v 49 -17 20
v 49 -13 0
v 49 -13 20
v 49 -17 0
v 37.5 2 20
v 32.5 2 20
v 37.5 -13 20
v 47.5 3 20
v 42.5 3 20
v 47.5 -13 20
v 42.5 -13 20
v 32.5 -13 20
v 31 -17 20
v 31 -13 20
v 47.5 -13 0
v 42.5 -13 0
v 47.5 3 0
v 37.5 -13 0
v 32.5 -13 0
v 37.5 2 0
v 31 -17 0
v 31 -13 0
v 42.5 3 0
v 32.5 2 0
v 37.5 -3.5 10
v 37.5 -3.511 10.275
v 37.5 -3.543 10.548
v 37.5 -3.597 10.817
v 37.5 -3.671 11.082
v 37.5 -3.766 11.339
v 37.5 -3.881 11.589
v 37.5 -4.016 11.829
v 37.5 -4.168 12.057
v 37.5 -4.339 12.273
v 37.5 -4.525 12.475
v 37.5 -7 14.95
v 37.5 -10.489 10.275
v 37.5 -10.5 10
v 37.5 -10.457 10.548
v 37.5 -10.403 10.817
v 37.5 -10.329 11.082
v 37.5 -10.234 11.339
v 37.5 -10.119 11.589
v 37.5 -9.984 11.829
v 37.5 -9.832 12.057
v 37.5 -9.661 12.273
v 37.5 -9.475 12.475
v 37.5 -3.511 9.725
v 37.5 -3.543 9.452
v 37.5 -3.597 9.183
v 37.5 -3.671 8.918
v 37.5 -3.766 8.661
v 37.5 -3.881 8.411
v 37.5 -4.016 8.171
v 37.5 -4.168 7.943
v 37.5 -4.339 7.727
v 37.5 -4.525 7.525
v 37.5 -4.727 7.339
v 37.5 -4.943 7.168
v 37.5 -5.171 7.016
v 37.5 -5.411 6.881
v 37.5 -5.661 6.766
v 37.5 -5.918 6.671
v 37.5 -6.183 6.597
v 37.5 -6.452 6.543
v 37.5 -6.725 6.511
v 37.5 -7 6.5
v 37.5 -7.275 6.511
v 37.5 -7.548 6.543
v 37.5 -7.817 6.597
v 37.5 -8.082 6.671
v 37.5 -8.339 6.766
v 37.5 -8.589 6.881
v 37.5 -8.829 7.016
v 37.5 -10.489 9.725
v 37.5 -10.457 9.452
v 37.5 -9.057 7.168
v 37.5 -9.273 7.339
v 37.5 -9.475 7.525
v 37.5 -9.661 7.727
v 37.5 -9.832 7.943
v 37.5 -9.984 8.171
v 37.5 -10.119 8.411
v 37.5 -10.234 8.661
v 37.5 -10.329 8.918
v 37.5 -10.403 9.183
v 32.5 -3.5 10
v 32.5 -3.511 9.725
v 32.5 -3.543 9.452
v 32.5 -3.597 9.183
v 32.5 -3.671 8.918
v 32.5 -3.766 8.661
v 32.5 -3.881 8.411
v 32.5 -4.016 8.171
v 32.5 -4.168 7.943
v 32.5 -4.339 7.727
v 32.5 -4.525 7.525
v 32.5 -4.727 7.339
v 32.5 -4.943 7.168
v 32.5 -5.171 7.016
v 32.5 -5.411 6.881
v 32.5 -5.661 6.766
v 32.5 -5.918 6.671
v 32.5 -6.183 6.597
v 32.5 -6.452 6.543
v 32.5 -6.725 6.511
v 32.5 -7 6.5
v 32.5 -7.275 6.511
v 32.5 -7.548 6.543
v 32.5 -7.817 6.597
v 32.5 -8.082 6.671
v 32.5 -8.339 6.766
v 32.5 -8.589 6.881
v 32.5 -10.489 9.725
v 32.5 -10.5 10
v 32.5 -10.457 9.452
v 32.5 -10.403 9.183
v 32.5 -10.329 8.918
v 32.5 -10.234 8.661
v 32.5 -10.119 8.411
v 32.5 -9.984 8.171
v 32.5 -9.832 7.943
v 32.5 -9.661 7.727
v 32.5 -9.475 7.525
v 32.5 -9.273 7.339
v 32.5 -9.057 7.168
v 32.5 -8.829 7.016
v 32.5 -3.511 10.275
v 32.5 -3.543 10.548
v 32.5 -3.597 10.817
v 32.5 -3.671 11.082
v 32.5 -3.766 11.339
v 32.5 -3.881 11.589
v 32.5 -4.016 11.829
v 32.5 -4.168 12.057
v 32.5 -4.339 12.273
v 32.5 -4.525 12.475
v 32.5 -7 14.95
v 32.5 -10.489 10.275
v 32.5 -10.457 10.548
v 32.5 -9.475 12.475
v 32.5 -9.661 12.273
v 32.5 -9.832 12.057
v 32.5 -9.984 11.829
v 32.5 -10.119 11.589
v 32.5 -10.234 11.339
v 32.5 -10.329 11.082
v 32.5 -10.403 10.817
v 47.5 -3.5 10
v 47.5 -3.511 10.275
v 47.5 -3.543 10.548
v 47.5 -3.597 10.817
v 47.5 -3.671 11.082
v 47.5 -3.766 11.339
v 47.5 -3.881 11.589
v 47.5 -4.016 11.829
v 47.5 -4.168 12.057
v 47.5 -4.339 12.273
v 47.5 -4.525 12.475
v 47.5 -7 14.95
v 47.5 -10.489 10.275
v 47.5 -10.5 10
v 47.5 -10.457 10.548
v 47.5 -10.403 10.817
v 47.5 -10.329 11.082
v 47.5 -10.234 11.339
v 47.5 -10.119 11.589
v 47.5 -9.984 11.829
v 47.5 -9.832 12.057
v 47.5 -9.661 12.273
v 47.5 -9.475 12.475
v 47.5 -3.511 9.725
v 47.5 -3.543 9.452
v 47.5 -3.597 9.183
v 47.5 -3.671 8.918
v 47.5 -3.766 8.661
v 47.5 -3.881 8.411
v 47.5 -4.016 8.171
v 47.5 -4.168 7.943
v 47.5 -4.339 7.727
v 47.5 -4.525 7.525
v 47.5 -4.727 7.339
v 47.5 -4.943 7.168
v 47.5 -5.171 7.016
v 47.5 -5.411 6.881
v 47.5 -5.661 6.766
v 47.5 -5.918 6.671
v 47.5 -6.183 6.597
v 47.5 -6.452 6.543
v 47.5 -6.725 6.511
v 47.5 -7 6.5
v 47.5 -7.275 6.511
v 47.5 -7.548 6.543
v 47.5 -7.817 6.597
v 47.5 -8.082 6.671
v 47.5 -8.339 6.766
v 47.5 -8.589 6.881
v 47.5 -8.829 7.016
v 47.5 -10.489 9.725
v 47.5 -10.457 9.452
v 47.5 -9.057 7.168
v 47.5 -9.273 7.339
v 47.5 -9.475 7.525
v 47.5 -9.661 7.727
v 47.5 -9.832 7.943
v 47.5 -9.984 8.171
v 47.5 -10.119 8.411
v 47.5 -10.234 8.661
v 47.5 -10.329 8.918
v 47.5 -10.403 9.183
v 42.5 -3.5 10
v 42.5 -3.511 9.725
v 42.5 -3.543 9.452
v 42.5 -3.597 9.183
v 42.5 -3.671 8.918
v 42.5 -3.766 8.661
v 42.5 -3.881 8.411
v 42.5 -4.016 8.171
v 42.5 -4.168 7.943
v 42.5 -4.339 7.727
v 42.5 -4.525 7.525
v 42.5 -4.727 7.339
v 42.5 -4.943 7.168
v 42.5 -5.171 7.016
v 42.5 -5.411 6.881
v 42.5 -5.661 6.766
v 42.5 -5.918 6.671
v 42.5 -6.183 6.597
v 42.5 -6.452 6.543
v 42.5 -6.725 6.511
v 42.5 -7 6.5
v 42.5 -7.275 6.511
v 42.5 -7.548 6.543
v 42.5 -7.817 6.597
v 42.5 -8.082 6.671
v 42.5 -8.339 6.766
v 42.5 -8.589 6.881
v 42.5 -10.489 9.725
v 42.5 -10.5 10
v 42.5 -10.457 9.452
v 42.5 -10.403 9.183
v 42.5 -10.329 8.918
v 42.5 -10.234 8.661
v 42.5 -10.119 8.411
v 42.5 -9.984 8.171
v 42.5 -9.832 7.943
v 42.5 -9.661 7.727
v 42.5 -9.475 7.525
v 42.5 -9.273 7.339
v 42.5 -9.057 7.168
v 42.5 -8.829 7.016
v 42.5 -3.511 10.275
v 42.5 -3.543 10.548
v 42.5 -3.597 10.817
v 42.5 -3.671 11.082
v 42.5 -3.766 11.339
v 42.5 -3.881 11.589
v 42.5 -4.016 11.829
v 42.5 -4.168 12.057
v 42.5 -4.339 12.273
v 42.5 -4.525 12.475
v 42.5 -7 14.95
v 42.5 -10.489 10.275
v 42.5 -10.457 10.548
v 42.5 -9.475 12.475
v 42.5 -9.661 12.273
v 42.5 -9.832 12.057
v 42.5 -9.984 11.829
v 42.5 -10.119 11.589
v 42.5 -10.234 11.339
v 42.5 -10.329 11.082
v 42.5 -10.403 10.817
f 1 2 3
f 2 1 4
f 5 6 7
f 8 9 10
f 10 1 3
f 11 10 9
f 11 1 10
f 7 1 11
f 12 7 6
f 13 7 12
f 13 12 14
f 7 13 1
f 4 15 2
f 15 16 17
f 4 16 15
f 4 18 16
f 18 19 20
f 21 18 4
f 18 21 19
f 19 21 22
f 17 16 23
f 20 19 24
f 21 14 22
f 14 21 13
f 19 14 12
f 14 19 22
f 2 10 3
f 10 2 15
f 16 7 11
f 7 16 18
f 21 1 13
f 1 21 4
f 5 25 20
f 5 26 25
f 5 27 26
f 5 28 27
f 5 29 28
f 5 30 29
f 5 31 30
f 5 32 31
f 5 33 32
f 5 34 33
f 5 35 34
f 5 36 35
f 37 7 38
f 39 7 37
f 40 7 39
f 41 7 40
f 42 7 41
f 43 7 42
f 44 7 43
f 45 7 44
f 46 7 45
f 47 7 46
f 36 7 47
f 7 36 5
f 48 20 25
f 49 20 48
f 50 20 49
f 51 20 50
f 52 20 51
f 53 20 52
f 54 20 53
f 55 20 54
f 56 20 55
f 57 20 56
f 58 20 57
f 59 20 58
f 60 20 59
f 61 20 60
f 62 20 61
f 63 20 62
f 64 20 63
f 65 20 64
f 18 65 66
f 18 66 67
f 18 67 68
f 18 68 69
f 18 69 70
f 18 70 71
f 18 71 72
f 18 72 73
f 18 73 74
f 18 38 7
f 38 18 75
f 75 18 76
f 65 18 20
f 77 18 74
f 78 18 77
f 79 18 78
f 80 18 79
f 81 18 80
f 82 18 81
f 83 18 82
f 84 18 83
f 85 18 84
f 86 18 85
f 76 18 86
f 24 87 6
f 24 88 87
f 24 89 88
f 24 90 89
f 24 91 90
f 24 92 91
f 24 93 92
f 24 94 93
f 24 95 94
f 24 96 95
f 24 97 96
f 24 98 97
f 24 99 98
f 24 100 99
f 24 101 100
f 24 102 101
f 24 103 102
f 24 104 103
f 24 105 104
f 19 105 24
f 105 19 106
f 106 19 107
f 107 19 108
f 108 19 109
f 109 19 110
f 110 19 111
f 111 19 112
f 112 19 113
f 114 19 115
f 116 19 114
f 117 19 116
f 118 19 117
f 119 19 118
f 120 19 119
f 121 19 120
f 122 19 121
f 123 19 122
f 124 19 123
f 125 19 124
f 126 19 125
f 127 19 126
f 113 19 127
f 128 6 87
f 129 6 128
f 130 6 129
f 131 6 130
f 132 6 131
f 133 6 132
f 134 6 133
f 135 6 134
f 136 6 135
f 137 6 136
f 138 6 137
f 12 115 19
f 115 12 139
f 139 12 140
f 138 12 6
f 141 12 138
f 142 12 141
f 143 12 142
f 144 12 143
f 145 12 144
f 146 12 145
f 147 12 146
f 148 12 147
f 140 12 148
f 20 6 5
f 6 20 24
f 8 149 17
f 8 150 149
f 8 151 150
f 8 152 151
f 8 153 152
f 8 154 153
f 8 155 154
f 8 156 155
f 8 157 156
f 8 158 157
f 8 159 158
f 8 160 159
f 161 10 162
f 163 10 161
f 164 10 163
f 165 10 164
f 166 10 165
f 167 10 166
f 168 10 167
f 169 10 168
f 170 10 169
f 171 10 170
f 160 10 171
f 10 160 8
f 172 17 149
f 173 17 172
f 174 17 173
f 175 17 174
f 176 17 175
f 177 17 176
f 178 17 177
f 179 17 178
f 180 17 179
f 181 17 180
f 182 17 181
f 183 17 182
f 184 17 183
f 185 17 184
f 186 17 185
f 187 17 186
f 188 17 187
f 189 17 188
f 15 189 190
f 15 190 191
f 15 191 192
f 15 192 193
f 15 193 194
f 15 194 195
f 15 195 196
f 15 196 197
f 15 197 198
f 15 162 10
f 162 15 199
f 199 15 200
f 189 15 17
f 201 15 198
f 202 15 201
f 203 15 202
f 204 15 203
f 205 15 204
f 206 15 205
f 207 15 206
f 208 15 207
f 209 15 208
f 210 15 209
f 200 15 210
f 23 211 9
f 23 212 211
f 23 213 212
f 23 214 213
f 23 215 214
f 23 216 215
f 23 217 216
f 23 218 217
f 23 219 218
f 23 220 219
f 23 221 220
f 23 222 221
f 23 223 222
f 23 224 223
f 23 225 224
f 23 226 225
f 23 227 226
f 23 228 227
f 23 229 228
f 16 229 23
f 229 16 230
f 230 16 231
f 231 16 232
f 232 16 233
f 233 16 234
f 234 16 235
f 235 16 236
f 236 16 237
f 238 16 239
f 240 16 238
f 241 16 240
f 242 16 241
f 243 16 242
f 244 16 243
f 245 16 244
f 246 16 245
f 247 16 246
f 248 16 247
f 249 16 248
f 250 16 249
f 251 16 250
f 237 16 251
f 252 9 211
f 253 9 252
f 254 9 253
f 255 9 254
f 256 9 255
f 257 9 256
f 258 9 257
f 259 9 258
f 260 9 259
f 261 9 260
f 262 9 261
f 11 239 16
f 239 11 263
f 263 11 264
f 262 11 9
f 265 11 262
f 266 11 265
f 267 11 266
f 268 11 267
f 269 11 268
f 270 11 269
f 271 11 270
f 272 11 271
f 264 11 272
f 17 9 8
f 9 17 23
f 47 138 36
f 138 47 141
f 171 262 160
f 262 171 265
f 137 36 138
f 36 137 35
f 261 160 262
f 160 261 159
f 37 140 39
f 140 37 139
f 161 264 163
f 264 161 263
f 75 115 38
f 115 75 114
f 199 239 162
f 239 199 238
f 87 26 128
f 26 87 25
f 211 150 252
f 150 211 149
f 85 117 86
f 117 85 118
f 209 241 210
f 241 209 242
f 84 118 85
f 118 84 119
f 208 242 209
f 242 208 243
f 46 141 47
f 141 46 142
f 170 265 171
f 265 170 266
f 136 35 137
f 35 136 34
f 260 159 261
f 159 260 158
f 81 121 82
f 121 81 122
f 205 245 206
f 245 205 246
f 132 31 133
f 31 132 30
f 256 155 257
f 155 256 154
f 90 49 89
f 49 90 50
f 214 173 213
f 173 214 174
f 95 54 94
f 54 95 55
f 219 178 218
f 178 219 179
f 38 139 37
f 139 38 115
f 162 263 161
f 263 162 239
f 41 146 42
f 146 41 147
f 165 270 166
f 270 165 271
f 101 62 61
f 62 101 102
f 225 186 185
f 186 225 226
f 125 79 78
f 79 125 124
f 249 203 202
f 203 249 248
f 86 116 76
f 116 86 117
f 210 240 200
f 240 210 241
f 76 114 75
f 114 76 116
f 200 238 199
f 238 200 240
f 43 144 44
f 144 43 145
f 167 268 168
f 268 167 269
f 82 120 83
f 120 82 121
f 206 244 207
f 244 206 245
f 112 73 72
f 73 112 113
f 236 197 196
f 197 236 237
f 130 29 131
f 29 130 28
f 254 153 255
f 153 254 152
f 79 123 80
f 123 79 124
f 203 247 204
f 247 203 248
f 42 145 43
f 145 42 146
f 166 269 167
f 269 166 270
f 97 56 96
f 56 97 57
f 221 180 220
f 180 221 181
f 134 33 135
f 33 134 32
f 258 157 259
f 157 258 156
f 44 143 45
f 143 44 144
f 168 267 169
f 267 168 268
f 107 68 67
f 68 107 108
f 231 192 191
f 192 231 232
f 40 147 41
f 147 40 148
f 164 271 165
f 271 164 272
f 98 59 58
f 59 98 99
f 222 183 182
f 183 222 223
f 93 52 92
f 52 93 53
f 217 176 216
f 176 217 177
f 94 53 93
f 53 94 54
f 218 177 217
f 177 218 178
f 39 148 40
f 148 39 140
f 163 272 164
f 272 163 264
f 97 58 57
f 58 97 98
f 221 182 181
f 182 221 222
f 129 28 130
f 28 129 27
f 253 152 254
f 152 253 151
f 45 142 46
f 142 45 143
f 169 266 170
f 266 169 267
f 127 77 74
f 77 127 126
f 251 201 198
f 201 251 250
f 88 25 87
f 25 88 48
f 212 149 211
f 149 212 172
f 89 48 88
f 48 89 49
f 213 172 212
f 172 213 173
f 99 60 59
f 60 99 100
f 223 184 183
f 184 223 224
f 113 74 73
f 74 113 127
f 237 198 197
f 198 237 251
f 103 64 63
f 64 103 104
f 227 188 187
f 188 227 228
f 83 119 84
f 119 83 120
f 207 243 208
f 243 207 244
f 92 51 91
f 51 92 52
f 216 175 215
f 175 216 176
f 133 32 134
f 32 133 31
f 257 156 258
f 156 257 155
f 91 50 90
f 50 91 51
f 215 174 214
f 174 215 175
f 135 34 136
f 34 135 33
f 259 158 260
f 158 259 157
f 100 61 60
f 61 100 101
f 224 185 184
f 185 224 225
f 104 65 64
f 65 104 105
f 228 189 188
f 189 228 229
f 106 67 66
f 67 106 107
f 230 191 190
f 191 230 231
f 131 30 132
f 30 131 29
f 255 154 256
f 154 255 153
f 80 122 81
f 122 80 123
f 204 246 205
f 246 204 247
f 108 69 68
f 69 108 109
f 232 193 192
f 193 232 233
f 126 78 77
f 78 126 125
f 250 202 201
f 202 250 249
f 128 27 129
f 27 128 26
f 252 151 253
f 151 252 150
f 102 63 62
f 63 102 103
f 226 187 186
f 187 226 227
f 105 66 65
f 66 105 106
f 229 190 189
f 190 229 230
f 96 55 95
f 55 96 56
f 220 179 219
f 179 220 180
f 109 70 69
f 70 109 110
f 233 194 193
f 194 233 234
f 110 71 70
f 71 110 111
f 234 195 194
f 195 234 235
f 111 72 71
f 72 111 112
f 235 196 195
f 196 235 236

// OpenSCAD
// Parametric Frame Vertex by Tonokip
// 2009.02.08
// Vertex Body derived from: frame-vertex_6off.aoi::body - edges
// http://reprap.svn.sourceforge.net/viewvc/reprap/trunk/mendel/mechanics/solid-models/cartesian-robot-m4/printed-parts/
// Fixed body geometry flaw per http://dev.forums.reprap.org/read.php?1,30132,30398
// License GNU GPL v2 or newer.

M3=4.3; 
M8=9.6;
vertex_height=20;
with_foot=1;		// Comment out for no foot.

FN=80;

translate ([0,0,vertex_height/2])difference() 
{
	union () {
		dxf_linear_extrude(file = "frame-vertex.dxf",height=vertex_height,center=true);
		//import_stl("vertex-body-fixed.stl");
		if (with_foot==1) {
			translate([40,-15,0]) vertex_foot();
		}
	}

	translate([11.013,59.912]) zhole(M8); 
	translate([35.013,39.999,0]) zhole(M8); 
	translate([40.274,9.249,0]) zhole(M8); 
	translate([40.217,30.992]) zhole(M3); 
	translate([29.829,48.986]) zhole(M3); 
	translate([0,21,0]) 
		xteardrop(M8,200);
	translate([13.687,41.010,0]) rotate(a=60,v=[0,0,1])
		xteardrop(M8,200);
}


module zhole(diameter) cylinder(h=100,r=(diameter/2),center=true,$fn=FN); 

module xteardrop(diameter,length) rotate(a=-90,v=[0,1,0]) rotate(a=-90,v=[0,0,1]) zteardrop(diameter,length);

module yteardrop(diameter,length) rotate(a=90,v=[1,0,0]) zteardrop(diameter,length);

module zteardrop(diameter,height)
{
	rotate(a=45, v=[0,0,1]) union()
	{
		translate([0,0,-height/2]) cube(size=[diameter/2,diameter/2,height],center=false);
		cylinder(r=diameter/2, h = height,center=true,$fn=FN);
	}
}

module vertex_foot() {
	difference () {
		union () {
			cube([18,4,vertex_height],center=true);
			translate ([-5,8,0]) cube([5,18,vertex_height],center=true);
			translate ([5,9,0]) cube([5,18,vertex_height],center=true);
		}
		translate ([0,8,0]) xteardrop(7,200);
	}
}
